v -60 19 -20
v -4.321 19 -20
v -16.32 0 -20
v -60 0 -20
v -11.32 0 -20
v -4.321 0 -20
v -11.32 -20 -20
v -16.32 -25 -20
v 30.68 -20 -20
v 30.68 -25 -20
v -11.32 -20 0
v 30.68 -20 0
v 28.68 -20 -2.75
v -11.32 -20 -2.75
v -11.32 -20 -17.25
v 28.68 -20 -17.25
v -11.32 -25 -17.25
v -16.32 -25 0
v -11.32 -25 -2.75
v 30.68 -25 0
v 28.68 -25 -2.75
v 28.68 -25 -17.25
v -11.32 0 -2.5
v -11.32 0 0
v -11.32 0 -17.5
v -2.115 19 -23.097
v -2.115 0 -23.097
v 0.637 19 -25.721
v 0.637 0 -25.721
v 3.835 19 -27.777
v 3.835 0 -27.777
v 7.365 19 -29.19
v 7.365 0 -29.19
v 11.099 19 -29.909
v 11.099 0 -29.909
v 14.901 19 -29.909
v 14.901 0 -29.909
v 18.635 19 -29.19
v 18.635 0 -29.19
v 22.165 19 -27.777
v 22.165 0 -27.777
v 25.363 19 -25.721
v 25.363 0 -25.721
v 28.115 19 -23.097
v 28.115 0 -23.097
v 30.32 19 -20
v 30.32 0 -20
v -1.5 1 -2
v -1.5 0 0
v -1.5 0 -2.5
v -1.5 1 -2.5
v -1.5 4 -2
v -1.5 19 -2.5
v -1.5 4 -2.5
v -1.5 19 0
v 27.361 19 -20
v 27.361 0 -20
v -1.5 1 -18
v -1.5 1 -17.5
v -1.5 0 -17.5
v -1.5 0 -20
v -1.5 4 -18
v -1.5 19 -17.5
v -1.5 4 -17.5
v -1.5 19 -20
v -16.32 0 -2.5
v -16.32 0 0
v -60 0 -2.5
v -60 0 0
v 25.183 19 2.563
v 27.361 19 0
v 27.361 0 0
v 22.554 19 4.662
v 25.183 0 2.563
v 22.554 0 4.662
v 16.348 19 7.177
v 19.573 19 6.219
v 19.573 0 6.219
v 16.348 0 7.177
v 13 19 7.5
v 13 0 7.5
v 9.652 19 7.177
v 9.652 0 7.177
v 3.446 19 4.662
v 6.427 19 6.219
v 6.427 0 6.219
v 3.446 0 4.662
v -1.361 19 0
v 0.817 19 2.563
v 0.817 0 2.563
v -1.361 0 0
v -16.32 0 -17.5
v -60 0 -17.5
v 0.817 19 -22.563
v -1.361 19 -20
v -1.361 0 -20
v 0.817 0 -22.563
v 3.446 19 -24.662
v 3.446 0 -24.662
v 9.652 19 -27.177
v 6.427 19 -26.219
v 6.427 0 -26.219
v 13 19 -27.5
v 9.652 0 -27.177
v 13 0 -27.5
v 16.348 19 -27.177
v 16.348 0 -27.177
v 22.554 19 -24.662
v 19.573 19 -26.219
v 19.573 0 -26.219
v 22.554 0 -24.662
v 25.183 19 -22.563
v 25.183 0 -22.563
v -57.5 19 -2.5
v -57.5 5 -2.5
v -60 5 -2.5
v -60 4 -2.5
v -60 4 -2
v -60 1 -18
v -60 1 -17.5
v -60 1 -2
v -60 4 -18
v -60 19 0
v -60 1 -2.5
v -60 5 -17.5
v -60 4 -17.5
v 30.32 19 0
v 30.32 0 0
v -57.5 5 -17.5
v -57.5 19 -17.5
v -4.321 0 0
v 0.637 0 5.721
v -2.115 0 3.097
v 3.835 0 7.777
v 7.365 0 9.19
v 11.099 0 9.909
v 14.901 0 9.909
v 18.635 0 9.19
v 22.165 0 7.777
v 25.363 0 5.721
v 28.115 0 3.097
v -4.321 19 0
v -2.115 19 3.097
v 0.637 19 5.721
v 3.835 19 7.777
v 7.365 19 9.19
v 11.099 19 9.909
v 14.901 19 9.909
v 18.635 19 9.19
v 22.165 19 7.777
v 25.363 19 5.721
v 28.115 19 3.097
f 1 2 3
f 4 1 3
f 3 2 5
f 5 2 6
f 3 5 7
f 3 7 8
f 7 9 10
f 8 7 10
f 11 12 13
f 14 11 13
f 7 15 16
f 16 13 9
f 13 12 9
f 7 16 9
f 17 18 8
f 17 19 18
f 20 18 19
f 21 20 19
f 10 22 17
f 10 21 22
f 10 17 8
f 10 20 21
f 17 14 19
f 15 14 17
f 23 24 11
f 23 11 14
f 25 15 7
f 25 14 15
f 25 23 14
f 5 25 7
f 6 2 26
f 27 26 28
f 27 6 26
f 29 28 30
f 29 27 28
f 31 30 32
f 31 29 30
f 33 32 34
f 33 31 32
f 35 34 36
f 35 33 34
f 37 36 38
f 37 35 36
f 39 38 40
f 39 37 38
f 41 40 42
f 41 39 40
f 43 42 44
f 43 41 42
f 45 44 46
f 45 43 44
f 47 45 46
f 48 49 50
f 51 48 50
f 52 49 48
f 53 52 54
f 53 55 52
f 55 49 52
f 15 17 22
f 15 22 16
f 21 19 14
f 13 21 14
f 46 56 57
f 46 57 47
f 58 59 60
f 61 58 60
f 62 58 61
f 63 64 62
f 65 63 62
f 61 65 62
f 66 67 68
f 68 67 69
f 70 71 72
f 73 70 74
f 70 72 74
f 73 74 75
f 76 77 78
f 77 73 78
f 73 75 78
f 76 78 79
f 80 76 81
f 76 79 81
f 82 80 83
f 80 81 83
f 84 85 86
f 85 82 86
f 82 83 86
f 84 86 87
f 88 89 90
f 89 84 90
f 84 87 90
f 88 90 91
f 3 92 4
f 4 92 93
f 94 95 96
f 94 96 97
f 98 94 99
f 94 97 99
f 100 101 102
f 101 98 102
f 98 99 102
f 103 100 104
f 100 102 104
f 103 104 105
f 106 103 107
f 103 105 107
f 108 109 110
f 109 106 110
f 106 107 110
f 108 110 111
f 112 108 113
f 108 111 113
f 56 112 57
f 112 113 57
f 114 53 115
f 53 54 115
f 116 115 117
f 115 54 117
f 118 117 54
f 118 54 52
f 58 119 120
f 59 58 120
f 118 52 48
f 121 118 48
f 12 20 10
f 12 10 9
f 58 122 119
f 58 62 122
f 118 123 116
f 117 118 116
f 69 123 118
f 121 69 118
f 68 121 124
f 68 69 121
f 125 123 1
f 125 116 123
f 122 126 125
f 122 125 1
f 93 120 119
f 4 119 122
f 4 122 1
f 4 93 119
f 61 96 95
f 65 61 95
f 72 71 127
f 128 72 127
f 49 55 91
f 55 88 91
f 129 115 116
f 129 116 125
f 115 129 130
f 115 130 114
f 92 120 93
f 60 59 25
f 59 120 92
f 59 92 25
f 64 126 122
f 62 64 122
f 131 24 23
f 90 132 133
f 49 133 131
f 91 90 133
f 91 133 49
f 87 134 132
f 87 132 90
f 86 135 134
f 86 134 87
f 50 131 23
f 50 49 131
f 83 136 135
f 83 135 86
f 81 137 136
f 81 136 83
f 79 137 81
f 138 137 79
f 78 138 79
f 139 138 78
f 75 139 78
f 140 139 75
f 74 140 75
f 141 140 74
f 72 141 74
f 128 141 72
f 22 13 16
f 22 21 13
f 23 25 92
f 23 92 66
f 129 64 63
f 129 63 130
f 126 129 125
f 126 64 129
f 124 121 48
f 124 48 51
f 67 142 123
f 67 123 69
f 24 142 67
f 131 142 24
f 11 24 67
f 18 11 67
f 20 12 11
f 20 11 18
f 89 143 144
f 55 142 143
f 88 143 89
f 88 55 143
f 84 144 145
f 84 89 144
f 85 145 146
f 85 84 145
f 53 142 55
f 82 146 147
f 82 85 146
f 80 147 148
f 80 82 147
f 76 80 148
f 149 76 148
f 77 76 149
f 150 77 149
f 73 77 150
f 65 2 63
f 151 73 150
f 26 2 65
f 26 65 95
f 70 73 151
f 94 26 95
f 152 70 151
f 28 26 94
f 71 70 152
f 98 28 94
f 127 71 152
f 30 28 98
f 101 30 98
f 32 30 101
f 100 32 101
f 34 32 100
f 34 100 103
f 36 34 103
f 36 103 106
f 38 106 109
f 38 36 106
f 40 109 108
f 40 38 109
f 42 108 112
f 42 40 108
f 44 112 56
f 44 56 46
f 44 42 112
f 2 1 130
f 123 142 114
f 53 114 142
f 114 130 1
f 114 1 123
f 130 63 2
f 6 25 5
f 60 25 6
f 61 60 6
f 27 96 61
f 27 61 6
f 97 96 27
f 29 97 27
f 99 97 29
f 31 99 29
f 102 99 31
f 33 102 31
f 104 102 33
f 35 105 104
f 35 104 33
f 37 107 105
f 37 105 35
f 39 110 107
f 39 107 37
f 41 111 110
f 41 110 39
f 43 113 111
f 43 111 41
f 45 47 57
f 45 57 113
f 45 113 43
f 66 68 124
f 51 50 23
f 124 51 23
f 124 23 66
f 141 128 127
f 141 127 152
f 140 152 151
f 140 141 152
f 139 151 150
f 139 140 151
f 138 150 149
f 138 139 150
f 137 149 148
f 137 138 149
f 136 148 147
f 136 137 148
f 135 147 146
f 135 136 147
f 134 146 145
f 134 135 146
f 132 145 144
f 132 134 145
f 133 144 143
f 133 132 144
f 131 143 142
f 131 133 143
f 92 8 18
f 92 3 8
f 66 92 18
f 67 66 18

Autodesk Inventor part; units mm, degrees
ref_plane "YZ Plane" through (0, 0, 0) normal (1, 0, 0) x (0, 1, 0)
ref_plane "XZ Plane" through (0, 0, 0) normal (0, 1, 0) x (-1, 0, 0)
ref_plane "XY Plane" through (0, 0, 0) normal (0, 0, 1) x (1, 0, 0)
sketch "Sketch1" plane through (0, 0, 0) normal (0, 1, 0) x (-1, 0, 0)
  line L0 (0, 0) -> (60, 0)
  line L1 (60, 0) -> (60, -20)
  line L2 (60, -20) -> (0, -20)
  line L3 (0, -20) -> (0, 0)
  dimension "d0" = 60
  dimension "d1" = 20
extrude "Extrusion1" add sketch "Sketch1" along normal blind 5
sketch "Sketch2" plane through (0, 5, 0) normal (0, 1, 0) x (1, 0, 0)
  line L0 (0, 20) -> (-60, 20) projected
  line L1 (0, 0) -> (0, 20) projected
  line L2 (-60, 20) -> (0, 20)
  line L3 (0, 20) -> (0, 17.5)
  line L4 (0, 17.5) -> (-60, 17.5)
  line L5 (-60, 17.5) -> (-60, 20)
  line L6 (-60, 20) -> (-60, 0) projected
  line L7 (-60, 0) -> (0, 0)
  line L8 (0, 0) -> (0, 2.5)
  line L9 (0, 2.5) -> (-60, 2.5)
  line L10 (-60, 2.5) -> (-60, 0)
  line L11 (-60, 0) -> (0, 0) projected
  line L12 (-60, 20) -> (-57.5, 20)
  line L13 (-57.5, 20) -> (-57.5, 0)
  line L14 (-57.5, 0) -> (-60, 0)
  line L15 (-60, 0) -> (-60, 20)
  line L16 (0, 20) -> (-2, 20)
  line L17 (-2, 20) -> (-2, 17.5)
  line L18 (-2, 17.5) -> (0, 17.5)
  line L19 (0, 17.5) -> (0, 20)
  line L20 (0, 2.5) -> (-2, 2.5)
  line L21 (-2, 2.5) -> (-2, 0)
  line L22 (-2, 0) -> (0, 0)
  line L23 (0, 0) -> (0, 2.5)
  point P0 (0, 2.5)
  point P1 (-57.5, 2.5)
  point P2 (-57.5, 17.5)
  dimension "d4" = 2.5
  dimension "d5" = 2.5
  dimension "d6" = 2.5
  dimension "d9" = 15
  dimension "d20" = 2
extrude "Extrusion2" add sketch "Sketch2" along normal blind 14 contours L1 L4 L17 L0 | L17 L4 L13 L0 | L13 L4 L5 L0 | L1 L7 L21 L9 | L13 L9 L6 L4 | L21 L7 L13 L9 | L13 L7 L6 L9
sketch "Sketch3" plane through (0, 5, 0) normal (0, 1, 0) x (1, 0, 0)
  line L0 (0, 0) -> (0, 2.5) projected
  line L1 (0, 0) -> (26, 0)
  line L2 (26, 0) -> (26, 20)
  line L3 (26, 20) -> (0, 20)
  line L4 (0, 20) -> (0, 0)
  circle A0 centre (13, 10) radius 17.5
  circle A1 centre (13, 10) radius 20
  line L5 (0, 2.5) -> (-57.5, 2.5) projected
  line L6 (0, 2.5) -> (26, 2.5)
  line L7 (26, 2.5) -> (26, 17.5)
  line L8 (26, 17.5) -> (0, 17.5)
  line L9 (0, 17.5) -> (0, 2.5)
  line L10 (0, 17.5) -> (-57.5, 17.5) projected
  line L11 (-57.5, 17.5) -> (-57.5, 2.5) projected
  line L12 (-57.5, 2.5) -> (0, 2.5) projected
  line L13 (0, 2.5) -> (0, 17.5) projected
  line L14 (-5.5405, 2.5) -> (0, 2.5)
  line L15 (-60, 0) -> (0, 0) projected
  line L16 (0, 0) -> (0, 2.5) projected
  line L17 (0, 2.5) -> (-57.5, 2.5) projected
  line L18 (-57.5, 2.5) -> (-57.5, 17.5) projected
  line L19 (-57.5, 17.5) -> (0, 17.5) projected
  line L20 (0, 17.5) -> (0, 20) projected
  line L21 (0, 20) -> (-60, 20) projected
  line L22 (-60, 20) -> (-60, 0) projected
  line L23 (-5.5405, 17.5) -> (0, 17.5)
  line L24 (26, 17.5) -> (31.5405, 17.5)
  line L25 (26, 2.5) -> (31.5405, 2.5)
  line L26 (26, 20) -> (30.3205, 20)
  line L27 (26, 0) -> (30.3205, 0)
  point P0 (-4.3205, 20)
  point P1 (-1.3614, 20)
  point P2 (-1.3614, 0)
  point P3 (-4.3205, 0)
  point P4 (28.8114, 2.5)
  point P5 (28.8114, 17.5)
  point P6 (27.3614, 20)
  point P7 (27.3614, 0)
  dimension "d10" = 26
  dimension "d11" = 20
  dimension "d13" = 35
  dimension "d14" = 40
  dimension "d17" = 15
extrude "Extrusion3" add sketch "Sketch3" along normal blind 14 and the other way blind 5 contours A0 L27 A1 L15 | L21 A1 L26 A0
sketch "Sketch4" plane through (0, 0, 0) normal (0, -1, 0) x (1, 0, 0)
  point P0 (0, 0)
sketch "Sketch5" plane through (0, 0, 0) normal (1, 0, 0) x (0, 0, -1)
  line L0 (17.5, 19) -> (20, 19) projected
  line L1 (0, 0) -> (20, 0) projected
  line L2 (20, 19) -> (17.5, 19)
  line L3 (17.5, 19) -> (17.5, 0)
  line L4 (17.5, 0) -> (20, 0)
  line L5 (20, 0) -> (20, 19)
  line L6 (2.5, 5) -> (2.5, 19) projected
  line L7 (2.5, 19) -> (0, 19)
  line L8 (0, 19) -> (0, 0)
  line L9 (0, 0) -> (2.5, 0)
  line L10 (2.5, 0) -> (2.5, 19)
  line L11 (17.5, 5) -> (2.5, 5)
  line L12 (2.5, 5) -> (2.5, 0)
  line L13 (2.5, 0) -> (17.5, 0)
  line L14 (17.5, 0) -> (17.5, 5)
  dimension "d21" = 2.5
extrude "Extrusion4" cut sketch "Sketch5" against normal blind 1.5
sketch "Sketch7" plane through (-60, 0, 0) normal (0, 0, 1) x (1, 0, 0)
  line L0 (0, 0) -> (55.6795, 0) projected
  line L1 (55.6795, 0) -> (90.3205, 0) projected
  line L2 (55.6795, 0) -> (55.6795, 19) projected
  line L3 (55.6795, 0) -> (48.6795, 0)
  line L4 (48.6795, 0) -> (48.6795, -25)
  line L5 (48.6795, -25) -> (55.6795, -25)
  line L6 (55.6795, -25) -> (55.6795, 0)
  line L7 (55.6795, -25) -> (90.6795, -25)
  line L8 (90.6795, -25) -> (90.6795, -20)
  line L9 (90.6795, -20) -> (55.6795, -20)
  line L10 (55.6795, -20) -> (55.6795, -25)
  point P0 (60, 0)
  dimension "d25" = 7
  dimension "d26" = 25
  dimension "d27" = 35
  dimension "d28" = 5
extrude "Extrusion5" add sketch "Sketch7" against normal up to surface (20 mm away)
sketch "Sketch8" plane through (0, 0, 0) normal (0, -1, 0) x (1, 0, 0)
  point P0 (0, 0)
sketch "Sketch9" plane through (-11.3205, -25, 0) normal (0, -1, 0) x (1, 0, 0)
  line L0 (0, -20) -> (42, -20) projected
  line L1 (0, 0) -> (42, 0) projected
  arc A0 (7, -20) -> (41.641, -20) centre (24.3205, -10) ccw projected
  line L2 (42.861, -17.5) -> (40.1319, -17.5) projected
  arc A1 (9.9591, -20) -> (38.6819, -20) centre (24.3205, -10) ccw projected
  line L3 (9.9591, -20) -> (9.8205, -20) projected
  line L4 (9.8205, 0) -> (9.9591, 0) projected
  arc A2 (38.6819, 0) -> (9.9591, 0) centre (24.3205, -10) ccw projected
  line L5 (40.1319, -2.5) -> (42.861, -2.5) projected
  arc A3 (41.641, 0) -> (7, 0) centre (24.3205, -10) ccw projected
  line L6 (5, -2.75) -> (40, -2.75)
  line L7 (40, -2.75) -> (40, -17.25)
  line L8 (40, -17.25) -> (5, -17.25)
  line L9 (5, -17.25) -> (5, -2.75)
  line L10 (0, 0) -> (0, -20) projected
  point P0 (11.3205, 0)
  point P1 (5, -10)
  dimension "d36" = 35
  dimension "d37" = 14.5
  dimension "d38" = 5
  dimension "d39" = 2.75
extrude "Extrusion6" cut sketch "Sketch9" against normal blind 10 contours L6 L7 L8 L9
sketch "Sketch10" plane through (-1.5, 0, 0) normal (1, 0, 0) x (0, 0, -1)
  line L0 (2.5, 5) -> (17.5, 5) projected
  line L1 (2.5, 19) -> (2.5, 5) projected
  line L2 (17.5, 5) -> (17.5, 19) projected
  line L3 (20, 0) -> (0, 0) projected
  line L4 (2.5, 5) -> (17.5, 5)
  line L5 (17.5, 5) -> (17.5, 0)
  line L6 (17.5, 0) -> (2.5, 0)
  line L7 (2.5, 0) -> (2.5, 5)
  line L8 (2.5, 4) -> (2, 4)
  line L9 (2, 4) -> (2, 1)
  line L10 (2, 1) -> (2.5, 1)
  line L11 (2.5, 1) -> (2.5, 4)
  line L12 (0, 0) -> (0, 19) projected
  line L13 (17.5, 4) -> (18, 4)
  line L14 (18, 4) -> (18, 1)
  line L15 (18, 1) -> (17.5, 1)
  line L16 (17.5, 1) -> (17.5, 4)
  line L17 (20, 19) -> (20, 0) projected
  point P0 (2.25, 4)
  point P1 (2.25, 1)
  point P2 (18, 2.5)
  point P3 (17.75, 1)
  point P4 (17.75, 4)
  point P5 (17.5, 1)
  point P6 (2.5, 1)
  dimension "d42" = 2
  dimension "d43" = 1
  dimension "d44" = 1
  dimension "d45" = 2
  dimension "d46" = 1
  dimension "d47" = 1
  dimension "d49" = 2.5
extrude "Extrusion7" cut sketch "Sketch10" against normal through all
sketch "Sketch11" plane through (-11.3205, -25, 0) normal (-1, 0, 0) x (0, 0, 1)
  line L0 (0, 25) -> (0, 0) projected
  line L1 (-20, 25) -> (-20, 0) projected
  line L2 (0, 0) -> (-20, 0)
  line L3 (-20, 0) -> (-20, 25)
  line L4 (-20, 25) -> (0, 25)
  line L5 (0, 25) -> (0, 0)
extrude "Extrusion8" add sketch "Sketch11" along normal blind 5
sketch "Sketch12" plane through (-4.3205, -20, 0) normal (1, 0, 0) x (0, 0, -1)
  line L0 (2.75, 5) -> (17.25, 5) projected
  line L1 (17.25, 0) -> (20, 0) projected
  line L2 (17.25, 5) -> (20, 5)
  line L3 (20, 5) -> (20, 0)
  line L4 (20, 0) -> (17.25, 0)
  line L5 (17.25, 0) -> (17.25, 5)
  line L6 (2.75, -5) -> (2.75, 5) projected
  line L7 (0, -5) -> (0, 20) projected
  line L8 (2.75, 5) -> (0, 5)
  line L9 (0, 5) -> (0, 0)
  line L10 (0, 0) -> (2.75, 0)
  line L11 (2.75, 0) -> (2.75, 5)
  line L12 (0, 20) -> (2.5, 20) projected
  line L13 (20, 5) -> (0, 5)
  line L14 (0, 5) -> (0, 20)
  line L15 (0, 20) -> (20, 20)
  line L16 (20, 20) -> (20, 5)
  point P0 (2.75, 0)
extrude "Extrusion9" cut sketch "Sketch12" against normal blind 7
sketch "Sketch13" plane through (-6.3205, -25, -2.75) normal (1, 0, 0) x (0, 0, -1)
  line L0 (0, 0) -> (0, 5) projected
  line L1 (14.5, 10) -> (0, 10)
  line L2 (0, 10) -> (0, 0)
  line L3 (0, 0) -> (14.5, 0)
  line L4 (14.5, 0) -> (14.5, 10)
  point P0 (-2.75, 25)
  point P1 (0, 5)
extrude "Extrusion10" cut sketch "Sketch13" against normal blind 5
sketch "Sketch14" plane through (-1.5, 19, -2.5) normal (0, 0, -1) x (-1, 0, 0)
  point P0 (-1.5, -19)
properties part number "Magasin_3DPrint"
